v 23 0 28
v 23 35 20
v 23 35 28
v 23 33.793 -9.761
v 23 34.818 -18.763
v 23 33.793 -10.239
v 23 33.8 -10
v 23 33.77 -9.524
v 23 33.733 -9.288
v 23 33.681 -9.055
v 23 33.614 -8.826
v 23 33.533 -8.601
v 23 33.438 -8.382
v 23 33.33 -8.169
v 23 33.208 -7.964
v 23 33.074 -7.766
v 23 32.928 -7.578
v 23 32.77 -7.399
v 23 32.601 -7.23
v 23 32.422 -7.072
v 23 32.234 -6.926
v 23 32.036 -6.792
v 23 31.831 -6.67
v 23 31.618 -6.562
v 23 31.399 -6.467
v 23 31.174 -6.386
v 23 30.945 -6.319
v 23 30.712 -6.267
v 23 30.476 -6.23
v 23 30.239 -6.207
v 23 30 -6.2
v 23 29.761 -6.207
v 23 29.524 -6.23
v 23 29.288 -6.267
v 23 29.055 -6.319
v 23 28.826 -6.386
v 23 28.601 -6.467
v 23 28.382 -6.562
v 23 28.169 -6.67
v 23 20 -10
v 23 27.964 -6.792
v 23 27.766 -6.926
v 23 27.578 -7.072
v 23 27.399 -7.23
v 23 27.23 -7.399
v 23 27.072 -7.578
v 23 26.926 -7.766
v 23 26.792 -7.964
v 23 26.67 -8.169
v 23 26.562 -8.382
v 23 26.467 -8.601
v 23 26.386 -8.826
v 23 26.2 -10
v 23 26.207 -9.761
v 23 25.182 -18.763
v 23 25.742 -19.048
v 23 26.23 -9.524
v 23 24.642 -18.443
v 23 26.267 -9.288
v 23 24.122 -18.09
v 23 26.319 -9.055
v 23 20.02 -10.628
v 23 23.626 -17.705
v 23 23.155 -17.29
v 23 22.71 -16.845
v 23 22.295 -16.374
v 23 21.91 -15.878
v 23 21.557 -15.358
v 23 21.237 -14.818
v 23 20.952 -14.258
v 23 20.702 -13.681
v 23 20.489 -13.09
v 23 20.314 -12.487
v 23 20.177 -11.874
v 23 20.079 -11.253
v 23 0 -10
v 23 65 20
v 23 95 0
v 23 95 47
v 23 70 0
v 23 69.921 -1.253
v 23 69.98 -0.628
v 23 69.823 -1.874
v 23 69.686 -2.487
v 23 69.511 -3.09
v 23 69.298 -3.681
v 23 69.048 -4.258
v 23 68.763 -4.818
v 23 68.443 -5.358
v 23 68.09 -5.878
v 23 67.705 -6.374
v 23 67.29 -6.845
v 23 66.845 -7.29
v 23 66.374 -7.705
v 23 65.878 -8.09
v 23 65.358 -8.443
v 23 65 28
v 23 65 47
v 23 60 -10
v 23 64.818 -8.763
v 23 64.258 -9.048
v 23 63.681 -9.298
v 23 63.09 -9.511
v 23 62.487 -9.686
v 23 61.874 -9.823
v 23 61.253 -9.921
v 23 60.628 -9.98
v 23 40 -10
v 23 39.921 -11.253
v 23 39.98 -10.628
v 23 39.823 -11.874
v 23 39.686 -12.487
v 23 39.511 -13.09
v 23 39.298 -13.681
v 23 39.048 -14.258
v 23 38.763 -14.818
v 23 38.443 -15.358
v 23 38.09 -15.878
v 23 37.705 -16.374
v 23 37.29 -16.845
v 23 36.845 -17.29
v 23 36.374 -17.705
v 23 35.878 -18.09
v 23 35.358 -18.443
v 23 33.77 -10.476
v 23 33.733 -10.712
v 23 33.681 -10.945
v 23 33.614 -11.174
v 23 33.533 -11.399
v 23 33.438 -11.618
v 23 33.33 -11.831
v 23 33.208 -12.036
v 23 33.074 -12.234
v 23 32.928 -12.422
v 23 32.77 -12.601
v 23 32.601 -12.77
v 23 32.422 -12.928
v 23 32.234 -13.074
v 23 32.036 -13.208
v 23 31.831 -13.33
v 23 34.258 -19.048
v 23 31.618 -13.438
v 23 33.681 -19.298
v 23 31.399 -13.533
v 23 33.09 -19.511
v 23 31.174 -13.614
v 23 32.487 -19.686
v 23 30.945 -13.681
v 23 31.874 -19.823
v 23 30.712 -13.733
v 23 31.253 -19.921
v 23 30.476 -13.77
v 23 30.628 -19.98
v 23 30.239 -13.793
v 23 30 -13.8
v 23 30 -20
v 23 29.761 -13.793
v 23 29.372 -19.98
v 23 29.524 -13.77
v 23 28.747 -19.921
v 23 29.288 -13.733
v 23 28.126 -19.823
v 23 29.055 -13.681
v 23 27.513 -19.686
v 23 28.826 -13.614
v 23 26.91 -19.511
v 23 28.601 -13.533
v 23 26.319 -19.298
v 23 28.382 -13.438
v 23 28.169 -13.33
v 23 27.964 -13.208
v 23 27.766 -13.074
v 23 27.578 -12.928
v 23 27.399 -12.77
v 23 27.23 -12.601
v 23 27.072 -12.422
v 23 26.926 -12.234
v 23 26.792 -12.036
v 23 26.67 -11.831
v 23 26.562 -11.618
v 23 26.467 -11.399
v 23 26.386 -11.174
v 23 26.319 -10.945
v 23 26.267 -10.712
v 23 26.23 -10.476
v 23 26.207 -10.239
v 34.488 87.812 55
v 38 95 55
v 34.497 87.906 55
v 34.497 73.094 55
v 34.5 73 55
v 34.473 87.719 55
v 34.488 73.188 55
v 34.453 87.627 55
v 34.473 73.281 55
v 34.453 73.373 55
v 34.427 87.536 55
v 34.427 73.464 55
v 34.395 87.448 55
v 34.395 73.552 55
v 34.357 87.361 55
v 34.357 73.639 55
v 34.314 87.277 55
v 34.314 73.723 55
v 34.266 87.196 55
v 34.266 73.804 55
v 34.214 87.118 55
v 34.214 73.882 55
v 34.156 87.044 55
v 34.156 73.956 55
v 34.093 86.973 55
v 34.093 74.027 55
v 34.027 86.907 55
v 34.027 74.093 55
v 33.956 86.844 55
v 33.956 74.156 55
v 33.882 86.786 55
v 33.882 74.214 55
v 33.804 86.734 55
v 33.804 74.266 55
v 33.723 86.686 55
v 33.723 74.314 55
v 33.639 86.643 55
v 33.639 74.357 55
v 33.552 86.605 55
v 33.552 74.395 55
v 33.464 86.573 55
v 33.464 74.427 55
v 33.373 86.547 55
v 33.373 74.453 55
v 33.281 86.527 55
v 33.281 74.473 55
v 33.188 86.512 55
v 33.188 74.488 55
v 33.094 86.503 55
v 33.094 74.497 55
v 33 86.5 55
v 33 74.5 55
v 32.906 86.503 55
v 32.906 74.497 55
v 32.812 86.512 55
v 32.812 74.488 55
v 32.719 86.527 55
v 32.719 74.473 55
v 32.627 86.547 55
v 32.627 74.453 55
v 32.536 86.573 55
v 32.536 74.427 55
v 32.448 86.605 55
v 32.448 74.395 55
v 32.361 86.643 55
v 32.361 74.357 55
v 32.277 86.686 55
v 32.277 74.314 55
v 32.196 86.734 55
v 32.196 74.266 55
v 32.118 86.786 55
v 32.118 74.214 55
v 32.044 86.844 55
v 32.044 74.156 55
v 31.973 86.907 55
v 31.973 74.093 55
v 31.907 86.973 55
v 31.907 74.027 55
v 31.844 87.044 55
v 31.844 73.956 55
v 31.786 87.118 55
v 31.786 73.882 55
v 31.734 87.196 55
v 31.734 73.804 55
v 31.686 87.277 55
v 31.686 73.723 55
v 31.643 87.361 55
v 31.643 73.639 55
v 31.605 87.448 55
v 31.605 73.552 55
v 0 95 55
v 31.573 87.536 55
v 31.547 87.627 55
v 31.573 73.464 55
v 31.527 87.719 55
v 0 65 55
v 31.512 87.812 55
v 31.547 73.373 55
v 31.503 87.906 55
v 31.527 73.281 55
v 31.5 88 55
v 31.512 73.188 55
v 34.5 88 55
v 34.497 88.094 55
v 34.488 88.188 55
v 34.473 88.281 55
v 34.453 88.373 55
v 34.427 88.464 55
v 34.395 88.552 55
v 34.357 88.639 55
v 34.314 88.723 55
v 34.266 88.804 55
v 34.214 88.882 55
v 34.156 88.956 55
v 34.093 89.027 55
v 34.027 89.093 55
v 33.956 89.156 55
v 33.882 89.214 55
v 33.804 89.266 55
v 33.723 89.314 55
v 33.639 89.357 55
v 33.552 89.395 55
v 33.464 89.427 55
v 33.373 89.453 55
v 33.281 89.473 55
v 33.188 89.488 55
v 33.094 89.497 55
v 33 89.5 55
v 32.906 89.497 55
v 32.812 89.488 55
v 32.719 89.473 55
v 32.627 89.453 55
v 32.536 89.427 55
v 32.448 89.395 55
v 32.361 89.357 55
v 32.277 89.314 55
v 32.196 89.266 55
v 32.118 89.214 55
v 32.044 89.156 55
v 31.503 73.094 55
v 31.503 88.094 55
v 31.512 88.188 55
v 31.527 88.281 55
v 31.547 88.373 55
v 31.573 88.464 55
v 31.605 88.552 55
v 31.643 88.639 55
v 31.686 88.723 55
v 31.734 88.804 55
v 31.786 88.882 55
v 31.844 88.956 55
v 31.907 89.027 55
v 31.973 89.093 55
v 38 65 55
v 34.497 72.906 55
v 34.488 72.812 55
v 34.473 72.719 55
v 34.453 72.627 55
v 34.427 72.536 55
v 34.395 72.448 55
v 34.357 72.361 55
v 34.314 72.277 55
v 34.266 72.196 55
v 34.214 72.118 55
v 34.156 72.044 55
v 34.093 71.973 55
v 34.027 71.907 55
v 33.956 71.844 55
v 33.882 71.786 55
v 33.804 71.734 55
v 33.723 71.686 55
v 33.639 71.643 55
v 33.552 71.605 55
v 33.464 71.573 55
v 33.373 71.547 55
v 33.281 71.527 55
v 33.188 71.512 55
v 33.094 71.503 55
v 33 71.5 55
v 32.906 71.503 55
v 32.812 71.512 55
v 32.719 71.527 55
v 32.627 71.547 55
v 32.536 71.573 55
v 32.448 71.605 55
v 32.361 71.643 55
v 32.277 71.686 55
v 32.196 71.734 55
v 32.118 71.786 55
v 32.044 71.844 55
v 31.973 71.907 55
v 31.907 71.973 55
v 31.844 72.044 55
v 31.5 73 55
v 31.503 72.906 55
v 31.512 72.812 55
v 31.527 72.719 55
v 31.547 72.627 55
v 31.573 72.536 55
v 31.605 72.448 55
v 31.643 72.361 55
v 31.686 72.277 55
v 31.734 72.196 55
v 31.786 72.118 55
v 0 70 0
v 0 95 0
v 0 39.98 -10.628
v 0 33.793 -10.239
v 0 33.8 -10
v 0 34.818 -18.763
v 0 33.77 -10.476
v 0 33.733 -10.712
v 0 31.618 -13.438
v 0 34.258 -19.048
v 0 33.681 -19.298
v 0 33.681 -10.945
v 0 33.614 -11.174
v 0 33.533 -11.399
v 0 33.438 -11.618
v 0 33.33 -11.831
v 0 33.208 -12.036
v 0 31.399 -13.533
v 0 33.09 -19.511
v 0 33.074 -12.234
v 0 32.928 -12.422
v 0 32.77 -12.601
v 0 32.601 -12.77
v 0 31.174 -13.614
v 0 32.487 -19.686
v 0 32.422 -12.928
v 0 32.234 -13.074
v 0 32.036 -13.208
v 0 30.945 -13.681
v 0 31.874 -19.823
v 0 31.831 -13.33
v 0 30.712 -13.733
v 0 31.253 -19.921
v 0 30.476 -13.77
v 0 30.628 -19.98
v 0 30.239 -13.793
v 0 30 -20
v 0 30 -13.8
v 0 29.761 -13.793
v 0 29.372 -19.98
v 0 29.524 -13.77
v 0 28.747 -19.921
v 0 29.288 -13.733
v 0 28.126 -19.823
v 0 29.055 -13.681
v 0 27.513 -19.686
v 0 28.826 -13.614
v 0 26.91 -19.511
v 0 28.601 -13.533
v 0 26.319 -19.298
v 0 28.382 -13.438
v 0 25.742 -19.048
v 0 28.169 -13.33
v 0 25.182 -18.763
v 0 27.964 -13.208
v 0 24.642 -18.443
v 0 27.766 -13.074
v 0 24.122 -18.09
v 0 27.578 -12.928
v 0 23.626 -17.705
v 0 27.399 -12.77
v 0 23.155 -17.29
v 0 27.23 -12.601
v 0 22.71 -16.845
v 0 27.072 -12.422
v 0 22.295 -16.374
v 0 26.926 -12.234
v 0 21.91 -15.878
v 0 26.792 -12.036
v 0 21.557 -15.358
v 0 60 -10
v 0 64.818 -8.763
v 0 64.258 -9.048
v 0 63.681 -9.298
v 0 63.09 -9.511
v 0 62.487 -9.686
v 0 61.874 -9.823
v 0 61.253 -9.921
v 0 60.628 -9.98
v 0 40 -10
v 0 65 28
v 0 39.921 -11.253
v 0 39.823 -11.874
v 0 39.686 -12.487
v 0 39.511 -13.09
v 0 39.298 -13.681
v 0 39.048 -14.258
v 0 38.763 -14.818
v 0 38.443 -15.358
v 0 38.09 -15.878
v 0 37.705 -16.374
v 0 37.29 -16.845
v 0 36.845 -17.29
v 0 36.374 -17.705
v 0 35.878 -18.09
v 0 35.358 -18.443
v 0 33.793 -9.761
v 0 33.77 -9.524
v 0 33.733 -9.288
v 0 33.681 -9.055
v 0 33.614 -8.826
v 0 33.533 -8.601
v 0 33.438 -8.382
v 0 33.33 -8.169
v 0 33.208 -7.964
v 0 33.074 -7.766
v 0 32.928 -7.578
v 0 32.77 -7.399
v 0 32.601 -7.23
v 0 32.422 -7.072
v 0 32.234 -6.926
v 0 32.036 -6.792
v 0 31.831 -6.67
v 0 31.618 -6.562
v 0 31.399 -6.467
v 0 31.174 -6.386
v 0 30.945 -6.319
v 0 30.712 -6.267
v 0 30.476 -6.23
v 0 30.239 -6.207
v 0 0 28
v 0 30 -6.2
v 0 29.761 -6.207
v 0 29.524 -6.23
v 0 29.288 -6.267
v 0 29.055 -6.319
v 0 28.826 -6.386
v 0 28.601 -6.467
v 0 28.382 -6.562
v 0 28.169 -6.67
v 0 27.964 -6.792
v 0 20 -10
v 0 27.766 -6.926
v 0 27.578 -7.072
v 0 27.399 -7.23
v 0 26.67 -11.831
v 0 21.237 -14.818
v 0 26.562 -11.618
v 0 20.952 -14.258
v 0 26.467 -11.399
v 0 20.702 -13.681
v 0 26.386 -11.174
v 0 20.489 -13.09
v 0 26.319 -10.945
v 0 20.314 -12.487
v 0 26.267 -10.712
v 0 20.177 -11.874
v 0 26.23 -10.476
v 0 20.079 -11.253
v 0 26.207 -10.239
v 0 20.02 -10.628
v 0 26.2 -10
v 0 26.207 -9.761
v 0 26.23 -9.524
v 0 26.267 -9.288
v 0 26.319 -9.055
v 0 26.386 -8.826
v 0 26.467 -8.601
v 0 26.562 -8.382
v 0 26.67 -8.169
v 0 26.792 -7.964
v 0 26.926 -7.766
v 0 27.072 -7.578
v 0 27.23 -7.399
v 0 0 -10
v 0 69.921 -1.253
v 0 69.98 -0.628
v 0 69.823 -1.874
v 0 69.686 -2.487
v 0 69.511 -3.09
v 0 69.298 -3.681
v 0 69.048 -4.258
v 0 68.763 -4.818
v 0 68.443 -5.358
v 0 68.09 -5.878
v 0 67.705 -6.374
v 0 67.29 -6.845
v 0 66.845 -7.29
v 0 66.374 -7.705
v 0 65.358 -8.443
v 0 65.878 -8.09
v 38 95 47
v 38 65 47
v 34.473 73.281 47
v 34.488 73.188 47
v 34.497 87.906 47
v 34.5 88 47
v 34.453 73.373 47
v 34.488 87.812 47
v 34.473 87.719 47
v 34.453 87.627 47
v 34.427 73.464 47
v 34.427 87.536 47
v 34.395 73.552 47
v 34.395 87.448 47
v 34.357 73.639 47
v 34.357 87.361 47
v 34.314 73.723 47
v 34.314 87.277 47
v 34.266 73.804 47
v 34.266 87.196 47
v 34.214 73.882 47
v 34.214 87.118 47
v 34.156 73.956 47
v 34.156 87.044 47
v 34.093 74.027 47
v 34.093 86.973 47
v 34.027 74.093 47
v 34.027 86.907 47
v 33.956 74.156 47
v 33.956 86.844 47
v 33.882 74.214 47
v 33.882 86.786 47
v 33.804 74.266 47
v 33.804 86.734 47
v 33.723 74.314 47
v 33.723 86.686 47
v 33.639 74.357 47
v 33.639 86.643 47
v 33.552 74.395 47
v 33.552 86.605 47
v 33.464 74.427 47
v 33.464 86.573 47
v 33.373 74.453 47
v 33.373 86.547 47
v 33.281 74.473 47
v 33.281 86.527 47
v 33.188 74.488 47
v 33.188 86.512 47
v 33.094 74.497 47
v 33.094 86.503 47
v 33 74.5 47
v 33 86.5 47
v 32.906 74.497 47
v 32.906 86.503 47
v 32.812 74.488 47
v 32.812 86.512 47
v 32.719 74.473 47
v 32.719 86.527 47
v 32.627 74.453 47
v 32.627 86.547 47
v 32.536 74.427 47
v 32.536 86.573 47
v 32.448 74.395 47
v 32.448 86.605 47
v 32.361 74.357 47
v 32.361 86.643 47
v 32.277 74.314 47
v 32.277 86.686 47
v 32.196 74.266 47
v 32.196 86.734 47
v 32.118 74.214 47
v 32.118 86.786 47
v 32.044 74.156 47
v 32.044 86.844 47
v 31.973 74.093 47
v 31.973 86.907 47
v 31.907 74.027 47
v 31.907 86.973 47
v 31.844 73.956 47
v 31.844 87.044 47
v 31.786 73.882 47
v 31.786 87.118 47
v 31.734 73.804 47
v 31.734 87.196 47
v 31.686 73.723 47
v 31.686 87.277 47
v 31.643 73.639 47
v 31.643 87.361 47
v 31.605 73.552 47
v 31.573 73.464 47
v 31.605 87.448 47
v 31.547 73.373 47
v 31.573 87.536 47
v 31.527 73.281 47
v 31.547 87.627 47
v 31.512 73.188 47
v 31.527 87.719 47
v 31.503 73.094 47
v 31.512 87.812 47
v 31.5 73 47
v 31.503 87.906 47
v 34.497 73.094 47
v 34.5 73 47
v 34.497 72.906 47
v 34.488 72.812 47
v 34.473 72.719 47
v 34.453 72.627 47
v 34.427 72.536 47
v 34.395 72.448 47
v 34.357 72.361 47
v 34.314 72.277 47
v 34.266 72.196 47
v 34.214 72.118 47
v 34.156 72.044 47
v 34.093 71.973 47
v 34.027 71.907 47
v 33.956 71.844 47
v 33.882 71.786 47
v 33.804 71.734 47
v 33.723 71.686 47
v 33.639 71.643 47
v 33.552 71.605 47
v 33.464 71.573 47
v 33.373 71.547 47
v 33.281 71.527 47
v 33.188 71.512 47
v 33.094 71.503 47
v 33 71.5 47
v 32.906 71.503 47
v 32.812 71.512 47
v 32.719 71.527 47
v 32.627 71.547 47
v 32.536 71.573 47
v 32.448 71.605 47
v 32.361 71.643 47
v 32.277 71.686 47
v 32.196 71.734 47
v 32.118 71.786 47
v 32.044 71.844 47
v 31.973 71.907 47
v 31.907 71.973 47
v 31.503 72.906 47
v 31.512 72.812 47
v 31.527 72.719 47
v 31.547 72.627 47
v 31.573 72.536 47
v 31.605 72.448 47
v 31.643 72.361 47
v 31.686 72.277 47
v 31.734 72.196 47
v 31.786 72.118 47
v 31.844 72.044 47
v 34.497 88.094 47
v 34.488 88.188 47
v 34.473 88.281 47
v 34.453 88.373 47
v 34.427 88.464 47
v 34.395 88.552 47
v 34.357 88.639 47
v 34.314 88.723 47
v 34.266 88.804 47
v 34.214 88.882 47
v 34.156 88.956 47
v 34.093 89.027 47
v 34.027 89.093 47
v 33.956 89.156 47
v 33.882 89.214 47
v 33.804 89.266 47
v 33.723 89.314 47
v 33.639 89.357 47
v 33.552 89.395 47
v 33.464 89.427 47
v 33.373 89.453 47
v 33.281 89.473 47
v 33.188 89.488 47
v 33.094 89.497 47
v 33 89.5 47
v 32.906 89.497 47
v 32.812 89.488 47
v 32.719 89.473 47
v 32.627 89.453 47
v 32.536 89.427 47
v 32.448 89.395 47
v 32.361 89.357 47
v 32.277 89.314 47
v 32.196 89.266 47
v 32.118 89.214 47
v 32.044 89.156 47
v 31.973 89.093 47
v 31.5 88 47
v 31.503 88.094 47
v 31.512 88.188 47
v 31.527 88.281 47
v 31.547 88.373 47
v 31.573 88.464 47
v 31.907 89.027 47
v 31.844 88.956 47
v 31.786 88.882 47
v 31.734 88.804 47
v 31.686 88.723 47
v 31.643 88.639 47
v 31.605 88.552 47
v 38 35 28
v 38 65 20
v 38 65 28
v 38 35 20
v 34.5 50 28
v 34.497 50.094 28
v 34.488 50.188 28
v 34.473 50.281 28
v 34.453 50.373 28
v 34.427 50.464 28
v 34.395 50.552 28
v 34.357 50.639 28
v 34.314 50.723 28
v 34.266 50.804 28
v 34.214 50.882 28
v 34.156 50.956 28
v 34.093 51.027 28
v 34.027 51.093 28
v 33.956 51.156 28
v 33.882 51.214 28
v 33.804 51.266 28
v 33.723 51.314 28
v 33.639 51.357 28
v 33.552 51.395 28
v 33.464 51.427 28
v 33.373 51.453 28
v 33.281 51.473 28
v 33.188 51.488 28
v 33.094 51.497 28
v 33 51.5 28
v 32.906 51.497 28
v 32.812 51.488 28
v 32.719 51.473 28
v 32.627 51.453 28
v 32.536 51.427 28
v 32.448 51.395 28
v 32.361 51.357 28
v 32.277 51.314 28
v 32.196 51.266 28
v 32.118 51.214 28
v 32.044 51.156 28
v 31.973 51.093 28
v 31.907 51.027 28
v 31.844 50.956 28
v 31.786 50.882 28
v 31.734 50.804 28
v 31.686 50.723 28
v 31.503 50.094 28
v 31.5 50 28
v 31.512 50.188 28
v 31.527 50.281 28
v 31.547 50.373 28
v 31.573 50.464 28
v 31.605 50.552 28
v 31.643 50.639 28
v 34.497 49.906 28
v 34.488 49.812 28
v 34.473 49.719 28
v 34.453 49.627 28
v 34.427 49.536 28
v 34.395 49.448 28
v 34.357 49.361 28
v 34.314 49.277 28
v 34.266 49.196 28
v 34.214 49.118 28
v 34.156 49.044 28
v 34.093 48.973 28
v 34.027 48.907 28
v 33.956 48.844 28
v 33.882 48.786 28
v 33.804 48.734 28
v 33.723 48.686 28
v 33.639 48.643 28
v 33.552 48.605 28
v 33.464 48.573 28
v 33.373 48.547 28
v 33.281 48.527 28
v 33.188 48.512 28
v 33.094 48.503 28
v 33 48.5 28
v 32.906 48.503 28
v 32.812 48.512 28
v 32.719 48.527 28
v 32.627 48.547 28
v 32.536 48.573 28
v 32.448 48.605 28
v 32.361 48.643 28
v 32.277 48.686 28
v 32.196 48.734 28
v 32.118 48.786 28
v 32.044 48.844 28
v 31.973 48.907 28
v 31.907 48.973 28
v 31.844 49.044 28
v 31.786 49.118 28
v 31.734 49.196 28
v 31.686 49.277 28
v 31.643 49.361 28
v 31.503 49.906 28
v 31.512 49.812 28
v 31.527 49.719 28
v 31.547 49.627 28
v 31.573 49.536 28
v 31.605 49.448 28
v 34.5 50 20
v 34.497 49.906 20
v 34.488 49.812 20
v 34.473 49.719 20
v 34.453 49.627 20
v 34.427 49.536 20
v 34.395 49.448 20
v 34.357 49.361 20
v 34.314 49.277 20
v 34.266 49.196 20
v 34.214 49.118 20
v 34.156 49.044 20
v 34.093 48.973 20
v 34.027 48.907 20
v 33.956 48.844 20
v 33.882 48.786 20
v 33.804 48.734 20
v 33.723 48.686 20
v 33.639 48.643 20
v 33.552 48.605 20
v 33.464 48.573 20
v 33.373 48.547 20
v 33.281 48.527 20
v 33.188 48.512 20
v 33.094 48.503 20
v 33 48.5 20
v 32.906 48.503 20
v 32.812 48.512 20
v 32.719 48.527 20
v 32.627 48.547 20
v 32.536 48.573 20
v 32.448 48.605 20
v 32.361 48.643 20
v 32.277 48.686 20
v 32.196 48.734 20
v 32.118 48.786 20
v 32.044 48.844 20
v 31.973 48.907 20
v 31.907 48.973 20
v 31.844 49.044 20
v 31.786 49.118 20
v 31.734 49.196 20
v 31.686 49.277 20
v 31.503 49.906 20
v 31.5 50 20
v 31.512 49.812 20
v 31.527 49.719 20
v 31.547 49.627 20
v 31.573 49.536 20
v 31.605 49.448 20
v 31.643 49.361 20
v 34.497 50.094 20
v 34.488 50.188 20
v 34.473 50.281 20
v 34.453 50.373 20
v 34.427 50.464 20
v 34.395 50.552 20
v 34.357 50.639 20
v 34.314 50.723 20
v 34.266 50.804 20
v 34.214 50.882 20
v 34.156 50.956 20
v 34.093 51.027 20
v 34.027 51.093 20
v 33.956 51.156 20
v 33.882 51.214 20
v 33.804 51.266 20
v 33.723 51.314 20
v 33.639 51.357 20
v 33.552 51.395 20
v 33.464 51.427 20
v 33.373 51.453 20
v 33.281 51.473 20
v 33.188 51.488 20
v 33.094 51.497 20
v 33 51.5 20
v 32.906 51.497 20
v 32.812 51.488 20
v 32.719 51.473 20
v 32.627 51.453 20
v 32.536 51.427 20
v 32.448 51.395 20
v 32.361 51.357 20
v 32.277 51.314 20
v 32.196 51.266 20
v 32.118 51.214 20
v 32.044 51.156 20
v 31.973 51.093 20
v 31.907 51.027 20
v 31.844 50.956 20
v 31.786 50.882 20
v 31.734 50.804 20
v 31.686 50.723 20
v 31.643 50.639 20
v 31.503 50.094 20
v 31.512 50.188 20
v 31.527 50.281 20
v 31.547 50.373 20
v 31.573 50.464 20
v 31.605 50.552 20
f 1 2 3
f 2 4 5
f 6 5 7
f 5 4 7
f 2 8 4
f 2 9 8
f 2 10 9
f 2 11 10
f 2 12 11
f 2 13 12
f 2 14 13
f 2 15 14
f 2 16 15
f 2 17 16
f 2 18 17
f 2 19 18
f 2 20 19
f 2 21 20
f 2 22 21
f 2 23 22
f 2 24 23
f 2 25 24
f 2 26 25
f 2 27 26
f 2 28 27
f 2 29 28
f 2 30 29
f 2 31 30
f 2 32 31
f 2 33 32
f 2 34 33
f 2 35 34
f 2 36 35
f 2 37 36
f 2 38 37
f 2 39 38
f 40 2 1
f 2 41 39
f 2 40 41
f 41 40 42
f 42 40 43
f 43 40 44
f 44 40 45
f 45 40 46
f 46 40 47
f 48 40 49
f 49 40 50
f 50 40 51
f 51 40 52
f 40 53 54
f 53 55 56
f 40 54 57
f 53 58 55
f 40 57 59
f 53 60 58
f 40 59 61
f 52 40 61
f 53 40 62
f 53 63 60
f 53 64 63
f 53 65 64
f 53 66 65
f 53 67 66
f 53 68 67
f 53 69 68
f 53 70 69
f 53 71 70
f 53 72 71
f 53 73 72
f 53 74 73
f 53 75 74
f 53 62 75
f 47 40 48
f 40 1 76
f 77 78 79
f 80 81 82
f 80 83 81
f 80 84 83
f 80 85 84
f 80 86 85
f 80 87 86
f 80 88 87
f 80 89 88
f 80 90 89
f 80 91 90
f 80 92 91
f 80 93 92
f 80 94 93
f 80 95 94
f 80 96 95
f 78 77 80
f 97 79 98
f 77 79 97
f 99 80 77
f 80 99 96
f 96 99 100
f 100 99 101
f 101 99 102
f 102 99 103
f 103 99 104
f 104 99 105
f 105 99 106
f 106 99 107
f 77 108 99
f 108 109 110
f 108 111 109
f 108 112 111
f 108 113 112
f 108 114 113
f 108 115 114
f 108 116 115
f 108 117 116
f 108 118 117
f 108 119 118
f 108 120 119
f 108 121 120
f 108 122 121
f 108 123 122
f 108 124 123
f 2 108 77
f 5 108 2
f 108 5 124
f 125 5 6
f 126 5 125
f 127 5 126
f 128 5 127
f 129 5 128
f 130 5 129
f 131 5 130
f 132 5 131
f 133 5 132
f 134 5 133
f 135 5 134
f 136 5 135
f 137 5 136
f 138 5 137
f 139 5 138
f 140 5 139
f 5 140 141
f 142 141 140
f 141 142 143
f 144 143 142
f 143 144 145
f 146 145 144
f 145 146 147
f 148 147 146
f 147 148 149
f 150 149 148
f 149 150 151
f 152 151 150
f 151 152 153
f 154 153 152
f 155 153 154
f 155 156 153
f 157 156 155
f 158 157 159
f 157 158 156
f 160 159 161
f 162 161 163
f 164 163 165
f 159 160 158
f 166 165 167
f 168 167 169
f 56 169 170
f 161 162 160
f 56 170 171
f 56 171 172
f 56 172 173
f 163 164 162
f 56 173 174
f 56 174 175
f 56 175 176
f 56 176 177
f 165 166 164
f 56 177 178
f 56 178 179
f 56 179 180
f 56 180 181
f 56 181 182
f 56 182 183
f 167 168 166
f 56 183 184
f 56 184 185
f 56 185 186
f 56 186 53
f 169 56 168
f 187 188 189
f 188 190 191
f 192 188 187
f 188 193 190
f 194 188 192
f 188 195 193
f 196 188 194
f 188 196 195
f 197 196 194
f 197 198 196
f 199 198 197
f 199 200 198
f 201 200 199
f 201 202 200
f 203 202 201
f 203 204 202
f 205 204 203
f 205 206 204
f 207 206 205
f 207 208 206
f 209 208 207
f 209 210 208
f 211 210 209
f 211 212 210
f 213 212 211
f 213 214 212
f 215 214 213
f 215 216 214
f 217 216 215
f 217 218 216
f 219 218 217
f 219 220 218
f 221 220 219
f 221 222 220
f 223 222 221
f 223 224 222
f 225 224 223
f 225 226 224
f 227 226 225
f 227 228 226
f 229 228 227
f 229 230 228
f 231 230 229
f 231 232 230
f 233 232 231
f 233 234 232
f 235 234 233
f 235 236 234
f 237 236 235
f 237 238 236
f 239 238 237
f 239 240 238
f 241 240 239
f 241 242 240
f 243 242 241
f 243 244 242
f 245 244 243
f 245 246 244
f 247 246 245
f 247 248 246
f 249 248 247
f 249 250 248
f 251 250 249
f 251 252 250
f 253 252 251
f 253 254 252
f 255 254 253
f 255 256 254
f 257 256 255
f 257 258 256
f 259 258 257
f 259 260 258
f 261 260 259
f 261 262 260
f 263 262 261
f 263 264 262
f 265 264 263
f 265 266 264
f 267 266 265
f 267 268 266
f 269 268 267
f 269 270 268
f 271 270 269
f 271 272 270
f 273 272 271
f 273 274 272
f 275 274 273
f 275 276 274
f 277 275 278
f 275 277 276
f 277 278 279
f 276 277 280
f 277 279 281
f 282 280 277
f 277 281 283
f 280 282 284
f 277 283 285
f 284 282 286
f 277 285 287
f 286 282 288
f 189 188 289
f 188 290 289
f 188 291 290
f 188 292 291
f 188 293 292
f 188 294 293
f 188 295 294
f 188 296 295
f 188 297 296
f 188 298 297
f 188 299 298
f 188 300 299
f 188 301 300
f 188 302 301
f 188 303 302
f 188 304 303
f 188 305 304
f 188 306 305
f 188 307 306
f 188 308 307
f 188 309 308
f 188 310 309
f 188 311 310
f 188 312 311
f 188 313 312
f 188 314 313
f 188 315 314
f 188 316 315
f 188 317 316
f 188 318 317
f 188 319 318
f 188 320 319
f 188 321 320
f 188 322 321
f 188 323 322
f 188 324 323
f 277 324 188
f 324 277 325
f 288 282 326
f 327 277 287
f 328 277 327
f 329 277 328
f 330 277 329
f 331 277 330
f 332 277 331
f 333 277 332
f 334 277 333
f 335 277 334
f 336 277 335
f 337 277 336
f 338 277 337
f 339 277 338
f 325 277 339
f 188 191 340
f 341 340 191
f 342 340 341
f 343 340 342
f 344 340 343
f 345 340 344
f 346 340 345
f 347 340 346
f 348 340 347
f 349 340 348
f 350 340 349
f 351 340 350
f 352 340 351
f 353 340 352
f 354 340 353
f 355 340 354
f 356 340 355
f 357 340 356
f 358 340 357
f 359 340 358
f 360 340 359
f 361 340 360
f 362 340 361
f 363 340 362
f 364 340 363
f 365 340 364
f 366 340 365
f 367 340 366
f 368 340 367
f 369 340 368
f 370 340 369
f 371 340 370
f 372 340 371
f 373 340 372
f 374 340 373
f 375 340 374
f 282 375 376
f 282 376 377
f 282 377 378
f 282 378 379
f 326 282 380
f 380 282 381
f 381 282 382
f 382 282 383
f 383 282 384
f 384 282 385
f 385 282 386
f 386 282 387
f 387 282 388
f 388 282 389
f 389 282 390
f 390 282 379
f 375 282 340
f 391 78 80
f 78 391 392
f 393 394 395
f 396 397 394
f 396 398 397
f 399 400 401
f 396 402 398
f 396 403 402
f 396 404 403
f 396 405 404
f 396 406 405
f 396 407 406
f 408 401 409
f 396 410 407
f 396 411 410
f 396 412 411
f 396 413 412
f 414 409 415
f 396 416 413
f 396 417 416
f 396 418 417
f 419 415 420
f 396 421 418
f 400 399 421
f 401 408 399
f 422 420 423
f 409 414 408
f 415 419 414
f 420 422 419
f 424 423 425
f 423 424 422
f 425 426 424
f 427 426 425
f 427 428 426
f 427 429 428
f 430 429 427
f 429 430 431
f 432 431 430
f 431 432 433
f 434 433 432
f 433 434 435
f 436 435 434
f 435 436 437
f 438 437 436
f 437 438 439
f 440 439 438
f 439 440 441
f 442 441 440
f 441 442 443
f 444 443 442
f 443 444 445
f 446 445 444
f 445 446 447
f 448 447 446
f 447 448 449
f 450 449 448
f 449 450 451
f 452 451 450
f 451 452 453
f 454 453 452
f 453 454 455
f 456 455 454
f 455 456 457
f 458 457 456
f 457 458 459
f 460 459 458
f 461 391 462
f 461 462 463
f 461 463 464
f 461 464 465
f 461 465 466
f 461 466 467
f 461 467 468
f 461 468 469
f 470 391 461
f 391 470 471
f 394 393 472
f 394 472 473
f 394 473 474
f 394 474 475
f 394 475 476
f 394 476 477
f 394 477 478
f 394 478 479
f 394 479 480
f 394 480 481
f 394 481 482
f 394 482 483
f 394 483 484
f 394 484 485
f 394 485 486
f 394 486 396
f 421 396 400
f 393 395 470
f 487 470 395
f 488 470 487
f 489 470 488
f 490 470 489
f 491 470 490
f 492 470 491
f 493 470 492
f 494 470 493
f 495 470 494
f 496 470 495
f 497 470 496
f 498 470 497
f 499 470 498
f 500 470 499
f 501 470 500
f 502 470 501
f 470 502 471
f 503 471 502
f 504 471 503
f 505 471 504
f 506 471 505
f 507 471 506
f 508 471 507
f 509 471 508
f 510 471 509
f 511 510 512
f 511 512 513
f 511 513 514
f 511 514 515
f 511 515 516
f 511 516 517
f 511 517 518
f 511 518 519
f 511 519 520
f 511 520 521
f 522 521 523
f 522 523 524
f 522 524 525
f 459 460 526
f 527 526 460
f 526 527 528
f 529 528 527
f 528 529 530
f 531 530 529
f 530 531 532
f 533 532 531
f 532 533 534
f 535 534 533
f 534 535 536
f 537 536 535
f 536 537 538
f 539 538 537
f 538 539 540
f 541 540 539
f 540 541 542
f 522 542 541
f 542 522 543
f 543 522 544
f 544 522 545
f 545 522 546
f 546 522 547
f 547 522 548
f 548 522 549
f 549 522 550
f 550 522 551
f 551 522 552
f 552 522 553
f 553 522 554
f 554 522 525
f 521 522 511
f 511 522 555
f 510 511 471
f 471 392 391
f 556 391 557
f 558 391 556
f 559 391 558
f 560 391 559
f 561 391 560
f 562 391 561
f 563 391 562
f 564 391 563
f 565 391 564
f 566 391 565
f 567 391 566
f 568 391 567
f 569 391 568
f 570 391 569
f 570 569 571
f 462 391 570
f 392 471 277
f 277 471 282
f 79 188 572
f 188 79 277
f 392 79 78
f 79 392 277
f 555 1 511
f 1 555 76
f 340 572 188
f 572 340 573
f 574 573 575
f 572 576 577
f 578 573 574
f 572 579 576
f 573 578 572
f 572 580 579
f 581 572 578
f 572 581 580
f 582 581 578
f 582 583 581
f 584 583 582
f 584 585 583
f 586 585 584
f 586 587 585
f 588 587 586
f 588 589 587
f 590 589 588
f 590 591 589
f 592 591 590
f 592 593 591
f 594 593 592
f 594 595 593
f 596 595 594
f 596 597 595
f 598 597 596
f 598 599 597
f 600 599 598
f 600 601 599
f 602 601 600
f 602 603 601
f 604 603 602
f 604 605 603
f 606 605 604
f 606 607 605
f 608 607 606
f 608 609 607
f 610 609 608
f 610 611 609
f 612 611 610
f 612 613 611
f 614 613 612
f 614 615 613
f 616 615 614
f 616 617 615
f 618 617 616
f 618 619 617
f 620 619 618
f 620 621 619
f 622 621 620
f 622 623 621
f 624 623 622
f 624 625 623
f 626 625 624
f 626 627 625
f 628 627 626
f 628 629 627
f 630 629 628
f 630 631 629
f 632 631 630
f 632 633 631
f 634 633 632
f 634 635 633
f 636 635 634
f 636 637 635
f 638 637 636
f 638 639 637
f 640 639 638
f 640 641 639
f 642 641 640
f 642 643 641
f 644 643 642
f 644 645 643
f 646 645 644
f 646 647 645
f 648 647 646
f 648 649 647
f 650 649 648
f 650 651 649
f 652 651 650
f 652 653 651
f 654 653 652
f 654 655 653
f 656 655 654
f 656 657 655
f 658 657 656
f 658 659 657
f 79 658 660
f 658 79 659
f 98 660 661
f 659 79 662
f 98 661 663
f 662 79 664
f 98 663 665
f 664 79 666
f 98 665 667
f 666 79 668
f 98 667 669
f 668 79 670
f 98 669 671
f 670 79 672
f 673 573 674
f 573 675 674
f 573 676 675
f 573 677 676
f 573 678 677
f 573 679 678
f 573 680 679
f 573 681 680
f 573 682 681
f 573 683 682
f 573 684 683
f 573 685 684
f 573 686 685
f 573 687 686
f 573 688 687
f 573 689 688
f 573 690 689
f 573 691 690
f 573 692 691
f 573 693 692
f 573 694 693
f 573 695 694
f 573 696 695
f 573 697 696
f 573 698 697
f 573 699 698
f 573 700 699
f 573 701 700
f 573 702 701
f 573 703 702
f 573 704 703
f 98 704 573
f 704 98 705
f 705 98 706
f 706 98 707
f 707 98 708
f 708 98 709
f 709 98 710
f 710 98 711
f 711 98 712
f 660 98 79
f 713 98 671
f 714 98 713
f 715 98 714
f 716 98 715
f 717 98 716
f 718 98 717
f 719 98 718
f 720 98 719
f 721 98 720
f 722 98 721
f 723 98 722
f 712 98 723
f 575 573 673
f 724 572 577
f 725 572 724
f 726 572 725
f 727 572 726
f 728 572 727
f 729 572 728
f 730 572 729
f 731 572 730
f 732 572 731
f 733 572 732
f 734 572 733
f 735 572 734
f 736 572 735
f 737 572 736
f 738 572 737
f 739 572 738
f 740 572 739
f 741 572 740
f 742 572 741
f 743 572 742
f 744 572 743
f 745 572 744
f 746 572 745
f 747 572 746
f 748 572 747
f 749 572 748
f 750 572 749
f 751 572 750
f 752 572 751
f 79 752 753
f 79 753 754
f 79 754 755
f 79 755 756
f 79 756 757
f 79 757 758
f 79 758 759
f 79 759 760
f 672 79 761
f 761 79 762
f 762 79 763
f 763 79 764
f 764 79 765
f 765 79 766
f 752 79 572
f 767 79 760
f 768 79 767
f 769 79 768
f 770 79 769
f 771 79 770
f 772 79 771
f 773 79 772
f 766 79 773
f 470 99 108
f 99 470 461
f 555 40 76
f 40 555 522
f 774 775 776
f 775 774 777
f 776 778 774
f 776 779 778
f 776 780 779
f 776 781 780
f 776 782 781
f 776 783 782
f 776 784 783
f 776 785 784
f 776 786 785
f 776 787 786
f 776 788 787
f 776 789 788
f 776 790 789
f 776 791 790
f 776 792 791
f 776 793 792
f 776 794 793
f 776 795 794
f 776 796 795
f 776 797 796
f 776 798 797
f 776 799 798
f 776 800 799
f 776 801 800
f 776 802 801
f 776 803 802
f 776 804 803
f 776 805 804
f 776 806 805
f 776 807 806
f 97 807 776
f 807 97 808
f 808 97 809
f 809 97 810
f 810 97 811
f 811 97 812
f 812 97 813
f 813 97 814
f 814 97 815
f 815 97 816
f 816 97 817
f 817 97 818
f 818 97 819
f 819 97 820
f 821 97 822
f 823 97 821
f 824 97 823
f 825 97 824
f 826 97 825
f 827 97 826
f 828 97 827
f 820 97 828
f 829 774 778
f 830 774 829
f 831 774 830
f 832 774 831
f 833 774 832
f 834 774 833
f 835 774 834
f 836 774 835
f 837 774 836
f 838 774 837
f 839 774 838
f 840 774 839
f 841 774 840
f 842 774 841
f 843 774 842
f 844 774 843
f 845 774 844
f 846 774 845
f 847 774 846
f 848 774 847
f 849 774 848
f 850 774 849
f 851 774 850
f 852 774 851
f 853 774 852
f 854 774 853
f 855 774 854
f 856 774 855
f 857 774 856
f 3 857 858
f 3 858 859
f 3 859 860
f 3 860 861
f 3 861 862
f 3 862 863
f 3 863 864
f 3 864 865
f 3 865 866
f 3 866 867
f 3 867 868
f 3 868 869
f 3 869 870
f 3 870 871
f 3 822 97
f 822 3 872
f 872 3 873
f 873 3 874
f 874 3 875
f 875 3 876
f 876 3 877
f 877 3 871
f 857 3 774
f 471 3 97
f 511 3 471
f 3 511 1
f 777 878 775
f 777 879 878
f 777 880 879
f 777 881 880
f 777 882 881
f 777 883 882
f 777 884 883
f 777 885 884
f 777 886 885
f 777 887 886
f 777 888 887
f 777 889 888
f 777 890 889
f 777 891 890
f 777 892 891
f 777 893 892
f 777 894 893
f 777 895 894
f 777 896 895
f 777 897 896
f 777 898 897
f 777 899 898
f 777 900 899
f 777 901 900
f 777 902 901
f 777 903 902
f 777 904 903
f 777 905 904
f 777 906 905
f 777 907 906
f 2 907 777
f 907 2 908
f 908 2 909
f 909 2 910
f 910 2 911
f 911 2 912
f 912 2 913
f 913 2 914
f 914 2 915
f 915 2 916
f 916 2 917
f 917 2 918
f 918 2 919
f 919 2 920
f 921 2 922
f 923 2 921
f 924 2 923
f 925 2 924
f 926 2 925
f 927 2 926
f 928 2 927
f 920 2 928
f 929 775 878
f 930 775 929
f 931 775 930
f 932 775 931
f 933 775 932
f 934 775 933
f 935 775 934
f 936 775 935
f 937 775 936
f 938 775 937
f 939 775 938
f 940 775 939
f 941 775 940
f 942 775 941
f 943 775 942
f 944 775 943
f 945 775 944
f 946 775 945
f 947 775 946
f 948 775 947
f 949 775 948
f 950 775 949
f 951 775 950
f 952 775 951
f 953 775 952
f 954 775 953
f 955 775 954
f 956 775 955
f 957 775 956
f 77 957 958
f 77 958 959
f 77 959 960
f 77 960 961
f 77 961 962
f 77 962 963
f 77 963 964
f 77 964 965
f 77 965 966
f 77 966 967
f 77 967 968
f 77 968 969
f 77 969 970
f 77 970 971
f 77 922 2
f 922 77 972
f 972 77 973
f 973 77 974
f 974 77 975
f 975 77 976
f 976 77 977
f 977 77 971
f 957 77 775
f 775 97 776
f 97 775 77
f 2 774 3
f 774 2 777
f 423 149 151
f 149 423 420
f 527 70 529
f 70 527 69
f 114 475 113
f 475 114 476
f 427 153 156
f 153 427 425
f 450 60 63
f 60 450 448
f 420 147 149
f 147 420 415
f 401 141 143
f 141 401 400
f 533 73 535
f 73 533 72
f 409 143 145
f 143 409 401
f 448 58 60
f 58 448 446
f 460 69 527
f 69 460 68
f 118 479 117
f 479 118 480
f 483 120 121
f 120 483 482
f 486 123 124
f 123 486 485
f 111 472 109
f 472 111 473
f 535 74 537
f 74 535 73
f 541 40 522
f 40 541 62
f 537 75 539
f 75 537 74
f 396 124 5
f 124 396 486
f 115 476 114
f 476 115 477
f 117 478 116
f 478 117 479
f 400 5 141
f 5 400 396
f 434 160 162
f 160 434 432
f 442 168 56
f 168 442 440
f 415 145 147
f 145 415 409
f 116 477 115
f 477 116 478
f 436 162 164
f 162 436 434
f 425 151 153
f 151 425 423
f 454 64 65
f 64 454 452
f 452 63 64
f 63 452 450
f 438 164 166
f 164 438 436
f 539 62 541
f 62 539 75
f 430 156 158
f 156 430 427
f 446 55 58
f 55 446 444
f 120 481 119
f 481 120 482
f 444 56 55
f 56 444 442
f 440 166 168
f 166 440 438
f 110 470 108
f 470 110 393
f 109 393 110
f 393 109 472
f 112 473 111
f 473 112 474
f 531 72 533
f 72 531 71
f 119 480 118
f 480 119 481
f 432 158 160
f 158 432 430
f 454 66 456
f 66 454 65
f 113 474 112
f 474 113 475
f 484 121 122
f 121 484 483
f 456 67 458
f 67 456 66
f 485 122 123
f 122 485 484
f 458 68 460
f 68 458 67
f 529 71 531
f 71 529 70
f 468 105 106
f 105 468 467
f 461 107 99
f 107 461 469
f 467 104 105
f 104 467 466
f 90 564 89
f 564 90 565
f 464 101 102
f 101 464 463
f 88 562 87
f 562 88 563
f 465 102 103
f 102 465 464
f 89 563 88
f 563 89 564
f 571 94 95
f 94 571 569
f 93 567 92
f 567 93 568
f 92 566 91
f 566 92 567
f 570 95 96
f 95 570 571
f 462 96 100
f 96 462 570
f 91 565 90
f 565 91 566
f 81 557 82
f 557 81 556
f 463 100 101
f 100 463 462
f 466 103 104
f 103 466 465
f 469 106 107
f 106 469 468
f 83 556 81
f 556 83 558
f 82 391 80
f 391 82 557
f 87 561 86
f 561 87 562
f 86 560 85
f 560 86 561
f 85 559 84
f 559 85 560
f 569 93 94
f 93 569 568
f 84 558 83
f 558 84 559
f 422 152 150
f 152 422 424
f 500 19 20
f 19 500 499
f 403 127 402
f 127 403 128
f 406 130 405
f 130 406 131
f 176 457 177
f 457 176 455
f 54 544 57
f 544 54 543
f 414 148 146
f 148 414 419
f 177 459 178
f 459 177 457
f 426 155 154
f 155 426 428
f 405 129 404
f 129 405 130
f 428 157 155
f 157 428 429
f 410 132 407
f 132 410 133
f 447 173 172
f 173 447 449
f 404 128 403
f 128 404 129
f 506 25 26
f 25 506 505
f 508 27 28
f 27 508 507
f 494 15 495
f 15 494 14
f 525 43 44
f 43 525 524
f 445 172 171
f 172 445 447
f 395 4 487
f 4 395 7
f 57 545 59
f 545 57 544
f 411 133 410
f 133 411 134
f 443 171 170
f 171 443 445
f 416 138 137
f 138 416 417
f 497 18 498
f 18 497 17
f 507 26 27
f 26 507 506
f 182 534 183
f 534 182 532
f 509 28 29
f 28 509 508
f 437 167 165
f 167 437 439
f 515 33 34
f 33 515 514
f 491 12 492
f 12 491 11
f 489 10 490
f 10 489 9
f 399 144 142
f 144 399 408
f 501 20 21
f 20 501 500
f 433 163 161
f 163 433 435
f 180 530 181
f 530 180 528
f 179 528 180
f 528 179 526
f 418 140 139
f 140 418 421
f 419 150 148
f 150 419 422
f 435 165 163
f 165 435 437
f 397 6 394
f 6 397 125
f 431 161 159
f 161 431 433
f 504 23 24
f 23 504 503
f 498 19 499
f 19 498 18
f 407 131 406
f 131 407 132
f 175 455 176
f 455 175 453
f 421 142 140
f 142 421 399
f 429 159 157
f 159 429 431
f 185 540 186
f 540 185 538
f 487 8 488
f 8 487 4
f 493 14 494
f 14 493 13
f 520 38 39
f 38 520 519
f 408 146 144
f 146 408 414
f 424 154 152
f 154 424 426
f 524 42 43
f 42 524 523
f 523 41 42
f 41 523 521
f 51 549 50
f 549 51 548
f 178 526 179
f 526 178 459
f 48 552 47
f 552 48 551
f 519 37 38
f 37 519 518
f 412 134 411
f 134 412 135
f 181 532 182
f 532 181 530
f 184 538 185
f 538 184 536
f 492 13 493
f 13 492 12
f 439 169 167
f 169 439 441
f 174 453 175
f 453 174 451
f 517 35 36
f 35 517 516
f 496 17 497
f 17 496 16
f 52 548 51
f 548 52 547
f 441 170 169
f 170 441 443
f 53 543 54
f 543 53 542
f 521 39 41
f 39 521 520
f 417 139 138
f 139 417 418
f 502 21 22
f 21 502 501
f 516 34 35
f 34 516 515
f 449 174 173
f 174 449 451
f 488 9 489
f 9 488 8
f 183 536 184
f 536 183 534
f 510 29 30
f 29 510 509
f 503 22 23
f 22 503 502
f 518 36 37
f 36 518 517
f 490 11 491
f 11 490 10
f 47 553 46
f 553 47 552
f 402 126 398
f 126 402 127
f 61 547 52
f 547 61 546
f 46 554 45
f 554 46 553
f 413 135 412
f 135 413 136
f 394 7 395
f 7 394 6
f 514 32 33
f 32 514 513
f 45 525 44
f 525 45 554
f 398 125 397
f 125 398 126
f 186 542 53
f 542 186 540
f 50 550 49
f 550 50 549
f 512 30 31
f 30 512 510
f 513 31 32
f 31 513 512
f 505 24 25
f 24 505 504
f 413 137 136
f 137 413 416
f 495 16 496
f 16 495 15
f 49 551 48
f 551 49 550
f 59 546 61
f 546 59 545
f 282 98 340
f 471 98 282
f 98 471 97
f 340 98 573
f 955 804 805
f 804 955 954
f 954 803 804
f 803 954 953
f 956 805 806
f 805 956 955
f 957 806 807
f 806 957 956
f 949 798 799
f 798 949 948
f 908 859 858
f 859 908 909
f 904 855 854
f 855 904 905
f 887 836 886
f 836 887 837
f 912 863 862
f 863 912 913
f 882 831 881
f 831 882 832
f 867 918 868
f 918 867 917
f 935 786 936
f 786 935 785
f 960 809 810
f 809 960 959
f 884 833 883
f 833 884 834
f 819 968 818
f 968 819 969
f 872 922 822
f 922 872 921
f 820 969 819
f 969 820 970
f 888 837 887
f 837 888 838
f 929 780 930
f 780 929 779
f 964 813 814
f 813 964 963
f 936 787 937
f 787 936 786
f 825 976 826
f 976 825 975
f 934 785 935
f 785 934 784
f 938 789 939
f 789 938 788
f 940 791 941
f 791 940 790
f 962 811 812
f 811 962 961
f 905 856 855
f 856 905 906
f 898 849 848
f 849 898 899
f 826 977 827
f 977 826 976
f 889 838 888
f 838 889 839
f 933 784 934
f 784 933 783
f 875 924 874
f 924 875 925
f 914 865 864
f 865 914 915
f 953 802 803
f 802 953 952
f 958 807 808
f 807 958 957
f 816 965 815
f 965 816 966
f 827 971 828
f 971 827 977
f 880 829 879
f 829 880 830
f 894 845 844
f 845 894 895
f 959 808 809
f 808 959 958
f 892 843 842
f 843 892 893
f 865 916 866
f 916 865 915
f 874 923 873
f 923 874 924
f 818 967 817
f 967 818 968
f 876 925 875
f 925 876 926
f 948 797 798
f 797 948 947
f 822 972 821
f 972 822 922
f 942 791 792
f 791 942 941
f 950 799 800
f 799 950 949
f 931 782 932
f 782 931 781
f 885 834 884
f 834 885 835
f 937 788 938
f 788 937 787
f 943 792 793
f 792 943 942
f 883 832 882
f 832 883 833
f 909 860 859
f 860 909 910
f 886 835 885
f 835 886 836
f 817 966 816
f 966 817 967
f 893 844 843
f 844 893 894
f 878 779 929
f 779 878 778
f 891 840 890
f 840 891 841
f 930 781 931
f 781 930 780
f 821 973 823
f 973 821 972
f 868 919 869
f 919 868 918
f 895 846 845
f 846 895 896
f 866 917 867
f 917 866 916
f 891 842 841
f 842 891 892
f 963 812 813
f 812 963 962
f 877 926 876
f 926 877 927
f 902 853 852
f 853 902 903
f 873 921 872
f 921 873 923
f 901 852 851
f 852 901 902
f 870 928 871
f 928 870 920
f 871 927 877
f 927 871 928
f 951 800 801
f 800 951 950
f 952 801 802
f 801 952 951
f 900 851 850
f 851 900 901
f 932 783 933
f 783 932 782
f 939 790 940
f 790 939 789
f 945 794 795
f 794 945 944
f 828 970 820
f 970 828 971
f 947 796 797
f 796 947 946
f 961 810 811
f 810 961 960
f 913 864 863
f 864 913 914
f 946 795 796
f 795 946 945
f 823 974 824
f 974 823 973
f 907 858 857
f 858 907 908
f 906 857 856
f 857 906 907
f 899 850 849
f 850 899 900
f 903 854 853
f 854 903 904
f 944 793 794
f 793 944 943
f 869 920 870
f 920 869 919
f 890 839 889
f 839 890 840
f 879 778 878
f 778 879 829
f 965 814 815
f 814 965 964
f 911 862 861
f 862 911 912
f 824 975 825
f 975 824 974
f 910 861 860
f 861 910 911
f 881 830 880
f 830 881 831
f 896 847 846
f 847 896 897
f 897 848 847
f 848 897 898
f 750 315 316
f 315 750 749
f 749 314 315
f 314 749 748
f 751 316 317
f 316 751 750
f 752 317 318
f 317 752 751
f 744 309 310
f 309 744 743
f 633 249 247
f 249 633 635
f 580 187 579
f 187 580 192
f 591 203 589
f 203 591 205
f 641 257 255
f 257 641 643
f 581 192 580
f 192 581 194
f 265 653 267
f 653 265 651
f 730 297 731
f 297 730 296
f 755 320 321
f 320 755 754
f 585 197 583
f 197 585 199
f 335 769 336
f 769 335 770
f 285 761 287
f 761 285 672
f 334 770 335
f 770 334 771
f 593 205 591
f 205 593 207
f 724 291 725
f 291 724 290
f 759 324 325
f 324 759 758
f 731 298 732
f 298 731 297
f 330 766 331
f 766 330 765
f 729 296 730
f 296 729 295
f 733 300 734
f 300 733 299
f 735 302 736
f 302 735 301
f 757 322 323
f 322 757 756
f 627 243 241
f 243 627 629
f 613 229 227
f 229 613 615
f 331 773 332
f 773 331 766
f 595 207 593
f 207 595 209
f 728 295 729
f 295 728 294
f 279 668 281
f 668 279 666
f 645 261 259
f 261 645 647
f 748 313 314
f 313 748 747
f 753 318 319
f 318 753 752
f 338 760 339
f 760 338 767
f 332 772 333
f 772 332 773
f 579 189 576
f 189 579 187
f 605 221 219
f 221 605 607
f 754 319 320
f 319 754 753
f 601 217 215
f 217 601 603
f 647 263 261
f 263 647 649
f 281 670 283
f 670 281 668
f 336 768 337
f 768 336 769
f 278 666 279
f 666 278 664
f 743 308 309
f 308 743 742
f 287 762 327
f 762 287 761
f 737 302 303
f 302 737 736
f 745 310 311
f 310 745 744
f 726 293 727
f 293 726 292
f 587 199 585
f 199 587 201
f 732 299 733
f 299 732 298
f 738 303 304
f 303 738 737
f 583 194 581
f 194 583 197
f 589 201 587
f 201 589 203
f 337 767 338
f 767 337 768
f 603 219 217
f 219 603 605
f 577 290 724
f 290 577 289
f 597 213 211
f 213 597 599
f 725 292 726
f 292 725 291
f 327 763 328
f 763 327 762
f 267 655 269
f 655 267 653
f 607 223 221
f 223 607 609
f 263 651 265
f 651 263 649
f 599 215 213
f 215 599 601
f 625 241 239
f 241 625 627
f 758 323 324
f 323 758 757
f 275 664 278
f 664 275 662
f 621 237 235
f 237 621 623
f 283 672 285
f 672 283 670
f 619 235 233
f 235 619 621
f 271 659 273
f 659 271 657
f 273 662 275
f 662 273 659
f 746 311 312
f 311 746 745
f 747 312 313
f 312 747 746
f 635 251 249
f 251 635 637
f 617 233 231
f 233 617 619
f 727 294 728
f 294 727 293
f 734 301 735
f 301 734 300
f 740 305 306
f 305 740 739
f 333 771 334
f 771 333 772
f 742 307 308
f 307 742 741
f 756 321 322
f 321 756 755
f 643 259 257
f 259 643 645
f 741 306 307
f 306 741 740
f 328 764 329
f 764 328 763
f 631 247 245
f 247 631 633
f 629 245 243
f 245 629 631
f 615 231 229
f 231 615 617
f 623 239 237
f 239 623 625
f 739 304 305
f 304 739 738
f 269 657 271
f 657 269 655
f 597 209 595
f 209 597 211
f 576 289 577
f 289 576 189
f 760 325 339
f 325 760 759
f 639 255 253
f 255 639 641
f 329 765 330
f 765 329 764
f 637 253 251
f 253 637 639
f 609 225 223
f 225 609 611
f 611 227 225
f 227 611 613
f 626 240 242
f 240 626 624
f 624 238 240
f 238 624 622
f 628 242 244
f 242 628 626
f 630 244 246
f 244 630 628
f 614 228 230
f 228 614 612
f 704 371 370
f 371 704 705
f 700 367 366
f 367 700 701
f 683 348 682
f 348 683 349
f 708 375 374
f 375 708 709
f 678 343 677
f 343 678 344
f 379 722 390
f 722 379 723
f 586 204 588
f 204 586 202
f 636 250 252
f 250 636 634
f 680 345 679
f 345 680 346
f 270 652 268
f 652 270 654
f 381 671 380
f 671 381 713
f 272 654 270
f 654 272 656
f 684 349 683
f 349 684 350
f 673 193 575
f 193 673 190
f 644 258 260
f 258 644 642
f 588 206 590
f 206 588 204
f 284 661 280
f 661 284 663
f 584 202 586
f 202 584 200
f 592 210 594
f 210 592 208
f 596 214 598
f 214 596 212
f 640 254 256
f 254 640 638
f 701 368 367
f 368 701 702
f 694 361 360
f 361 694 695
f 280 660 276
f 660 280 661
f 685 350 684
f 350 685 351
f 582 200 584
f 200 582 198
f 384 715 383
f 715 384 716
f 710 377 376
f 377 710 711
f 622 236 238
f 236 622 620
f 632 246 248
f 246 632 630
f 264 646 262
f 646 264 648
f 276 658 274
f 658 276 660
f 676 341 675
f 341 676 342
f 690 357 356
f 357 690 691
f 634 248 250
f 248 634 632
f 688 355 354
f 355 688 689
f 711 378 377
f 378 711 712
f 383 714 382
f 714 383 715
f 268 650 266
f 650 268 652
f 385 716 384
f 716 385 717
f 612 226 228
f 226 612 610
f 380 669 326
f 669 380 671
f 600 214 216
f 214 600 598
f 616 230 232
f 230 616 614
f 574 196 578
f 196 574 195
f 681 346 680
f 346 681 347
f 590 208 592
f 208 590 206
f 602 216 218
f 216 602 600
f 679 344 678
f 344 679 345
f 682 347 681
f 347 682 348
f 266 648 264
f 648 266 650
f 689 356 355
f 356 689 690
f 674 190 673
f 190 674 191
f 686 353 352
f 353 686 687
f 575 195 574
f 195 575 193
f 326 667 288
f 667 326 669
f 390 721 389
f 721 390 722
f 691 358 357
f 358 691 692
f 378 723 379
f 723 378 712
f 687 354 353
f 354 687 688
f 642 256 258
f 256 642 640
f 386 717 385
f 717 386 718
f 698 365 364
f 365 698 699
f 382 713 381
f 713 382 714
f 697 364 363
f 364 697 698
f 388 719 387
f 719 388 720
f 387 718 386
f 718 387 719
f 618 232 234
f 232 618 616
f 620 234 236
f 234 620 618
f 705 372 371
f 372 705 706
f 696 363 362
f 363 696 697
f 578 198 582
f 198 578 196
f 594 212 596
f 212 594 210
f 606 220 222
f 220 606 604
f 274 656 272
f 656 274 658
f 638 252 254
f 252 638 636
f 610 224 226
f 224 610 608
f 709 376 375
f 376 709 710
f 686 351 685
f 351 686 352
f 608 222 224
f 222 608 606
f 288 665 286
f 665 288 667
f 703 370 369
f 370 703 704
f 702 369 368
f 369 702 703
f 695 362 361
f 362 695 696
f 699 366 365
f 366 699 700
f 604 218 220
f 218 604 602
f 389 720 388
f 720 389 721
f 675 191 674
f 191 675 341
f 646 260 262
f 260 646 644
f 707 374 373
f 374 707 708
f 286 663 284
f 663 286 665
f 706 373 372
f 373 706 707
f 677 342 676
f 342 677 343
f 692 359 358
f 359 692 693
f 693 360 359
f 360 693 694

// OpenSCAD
difference(){
	union(){

       translate([0,0,0]){
           cube([23,95,55], center=false);
       }
       translate([0,35,55-8]){
           cube([23+15,60,8], center=false);
       }
       translate([0,0,-10]){
           cube([23,60,10], center=false);
       }
       translate([0,35,55-27-8]){
           cube([23+15,30,8], center=false);
       }

       translate([0,30,-10]){
            rotate(a = [0,90,0]) {
              cylinder(h=23, r=10, $fn=100, center=false);
            }
       }	
       translate([0,60,0]){
            rotate(a = [0,90,0]) {
              cylinder(h=23, r=10, $fn=100, center=false);
            }
       }	
	}
	union() {
       translate([-10,30,-10]){
            rotate(a = [0,90,0]) {
              cylinder(h=100, r=3.8, $fn=100, center=false);
            }
       }	        
       translate([-20,-10,55-27]){
           cube([60,75,55], center=false);
       }

       translate([33,50,-20]){
            rotate(a = [0,0,90]) {
              cylinder(h=70, r=1.5, $fn=100, center=false);
            }
       }	

       translate([12.5,7-35,-10]){
            rotate(a = [0,0,90]) {
              cylinder(h=100, r=1.5, $fn=100, center=false);
            }
       }	
       translate([33,60-7+35,-10]){
            rotate(a = [0,0,90]) {
              cylinder(h=100, r=1.5, $fn=100, center=false);
            }
       }	
       translate([33,60-7+20,-10]){
            rotate(a = [0,0,90]) {
              cylinder(h=100, r=1.5, $fn=100, center=false);
            }
       }	
       translate([50,60-7+35,-10]){
            rotate(a = [0,0,90]) {
              cylinder(h=100, r=1.5, $fn=100, center=false);
            }
       }	
       translate([50,60-7+20,-10]){
            rotate(a = [0,0,90]) {
              cylinder(h=100, r=1.5, $fn=100, center=false);
            }
       }	



        
	}
}
